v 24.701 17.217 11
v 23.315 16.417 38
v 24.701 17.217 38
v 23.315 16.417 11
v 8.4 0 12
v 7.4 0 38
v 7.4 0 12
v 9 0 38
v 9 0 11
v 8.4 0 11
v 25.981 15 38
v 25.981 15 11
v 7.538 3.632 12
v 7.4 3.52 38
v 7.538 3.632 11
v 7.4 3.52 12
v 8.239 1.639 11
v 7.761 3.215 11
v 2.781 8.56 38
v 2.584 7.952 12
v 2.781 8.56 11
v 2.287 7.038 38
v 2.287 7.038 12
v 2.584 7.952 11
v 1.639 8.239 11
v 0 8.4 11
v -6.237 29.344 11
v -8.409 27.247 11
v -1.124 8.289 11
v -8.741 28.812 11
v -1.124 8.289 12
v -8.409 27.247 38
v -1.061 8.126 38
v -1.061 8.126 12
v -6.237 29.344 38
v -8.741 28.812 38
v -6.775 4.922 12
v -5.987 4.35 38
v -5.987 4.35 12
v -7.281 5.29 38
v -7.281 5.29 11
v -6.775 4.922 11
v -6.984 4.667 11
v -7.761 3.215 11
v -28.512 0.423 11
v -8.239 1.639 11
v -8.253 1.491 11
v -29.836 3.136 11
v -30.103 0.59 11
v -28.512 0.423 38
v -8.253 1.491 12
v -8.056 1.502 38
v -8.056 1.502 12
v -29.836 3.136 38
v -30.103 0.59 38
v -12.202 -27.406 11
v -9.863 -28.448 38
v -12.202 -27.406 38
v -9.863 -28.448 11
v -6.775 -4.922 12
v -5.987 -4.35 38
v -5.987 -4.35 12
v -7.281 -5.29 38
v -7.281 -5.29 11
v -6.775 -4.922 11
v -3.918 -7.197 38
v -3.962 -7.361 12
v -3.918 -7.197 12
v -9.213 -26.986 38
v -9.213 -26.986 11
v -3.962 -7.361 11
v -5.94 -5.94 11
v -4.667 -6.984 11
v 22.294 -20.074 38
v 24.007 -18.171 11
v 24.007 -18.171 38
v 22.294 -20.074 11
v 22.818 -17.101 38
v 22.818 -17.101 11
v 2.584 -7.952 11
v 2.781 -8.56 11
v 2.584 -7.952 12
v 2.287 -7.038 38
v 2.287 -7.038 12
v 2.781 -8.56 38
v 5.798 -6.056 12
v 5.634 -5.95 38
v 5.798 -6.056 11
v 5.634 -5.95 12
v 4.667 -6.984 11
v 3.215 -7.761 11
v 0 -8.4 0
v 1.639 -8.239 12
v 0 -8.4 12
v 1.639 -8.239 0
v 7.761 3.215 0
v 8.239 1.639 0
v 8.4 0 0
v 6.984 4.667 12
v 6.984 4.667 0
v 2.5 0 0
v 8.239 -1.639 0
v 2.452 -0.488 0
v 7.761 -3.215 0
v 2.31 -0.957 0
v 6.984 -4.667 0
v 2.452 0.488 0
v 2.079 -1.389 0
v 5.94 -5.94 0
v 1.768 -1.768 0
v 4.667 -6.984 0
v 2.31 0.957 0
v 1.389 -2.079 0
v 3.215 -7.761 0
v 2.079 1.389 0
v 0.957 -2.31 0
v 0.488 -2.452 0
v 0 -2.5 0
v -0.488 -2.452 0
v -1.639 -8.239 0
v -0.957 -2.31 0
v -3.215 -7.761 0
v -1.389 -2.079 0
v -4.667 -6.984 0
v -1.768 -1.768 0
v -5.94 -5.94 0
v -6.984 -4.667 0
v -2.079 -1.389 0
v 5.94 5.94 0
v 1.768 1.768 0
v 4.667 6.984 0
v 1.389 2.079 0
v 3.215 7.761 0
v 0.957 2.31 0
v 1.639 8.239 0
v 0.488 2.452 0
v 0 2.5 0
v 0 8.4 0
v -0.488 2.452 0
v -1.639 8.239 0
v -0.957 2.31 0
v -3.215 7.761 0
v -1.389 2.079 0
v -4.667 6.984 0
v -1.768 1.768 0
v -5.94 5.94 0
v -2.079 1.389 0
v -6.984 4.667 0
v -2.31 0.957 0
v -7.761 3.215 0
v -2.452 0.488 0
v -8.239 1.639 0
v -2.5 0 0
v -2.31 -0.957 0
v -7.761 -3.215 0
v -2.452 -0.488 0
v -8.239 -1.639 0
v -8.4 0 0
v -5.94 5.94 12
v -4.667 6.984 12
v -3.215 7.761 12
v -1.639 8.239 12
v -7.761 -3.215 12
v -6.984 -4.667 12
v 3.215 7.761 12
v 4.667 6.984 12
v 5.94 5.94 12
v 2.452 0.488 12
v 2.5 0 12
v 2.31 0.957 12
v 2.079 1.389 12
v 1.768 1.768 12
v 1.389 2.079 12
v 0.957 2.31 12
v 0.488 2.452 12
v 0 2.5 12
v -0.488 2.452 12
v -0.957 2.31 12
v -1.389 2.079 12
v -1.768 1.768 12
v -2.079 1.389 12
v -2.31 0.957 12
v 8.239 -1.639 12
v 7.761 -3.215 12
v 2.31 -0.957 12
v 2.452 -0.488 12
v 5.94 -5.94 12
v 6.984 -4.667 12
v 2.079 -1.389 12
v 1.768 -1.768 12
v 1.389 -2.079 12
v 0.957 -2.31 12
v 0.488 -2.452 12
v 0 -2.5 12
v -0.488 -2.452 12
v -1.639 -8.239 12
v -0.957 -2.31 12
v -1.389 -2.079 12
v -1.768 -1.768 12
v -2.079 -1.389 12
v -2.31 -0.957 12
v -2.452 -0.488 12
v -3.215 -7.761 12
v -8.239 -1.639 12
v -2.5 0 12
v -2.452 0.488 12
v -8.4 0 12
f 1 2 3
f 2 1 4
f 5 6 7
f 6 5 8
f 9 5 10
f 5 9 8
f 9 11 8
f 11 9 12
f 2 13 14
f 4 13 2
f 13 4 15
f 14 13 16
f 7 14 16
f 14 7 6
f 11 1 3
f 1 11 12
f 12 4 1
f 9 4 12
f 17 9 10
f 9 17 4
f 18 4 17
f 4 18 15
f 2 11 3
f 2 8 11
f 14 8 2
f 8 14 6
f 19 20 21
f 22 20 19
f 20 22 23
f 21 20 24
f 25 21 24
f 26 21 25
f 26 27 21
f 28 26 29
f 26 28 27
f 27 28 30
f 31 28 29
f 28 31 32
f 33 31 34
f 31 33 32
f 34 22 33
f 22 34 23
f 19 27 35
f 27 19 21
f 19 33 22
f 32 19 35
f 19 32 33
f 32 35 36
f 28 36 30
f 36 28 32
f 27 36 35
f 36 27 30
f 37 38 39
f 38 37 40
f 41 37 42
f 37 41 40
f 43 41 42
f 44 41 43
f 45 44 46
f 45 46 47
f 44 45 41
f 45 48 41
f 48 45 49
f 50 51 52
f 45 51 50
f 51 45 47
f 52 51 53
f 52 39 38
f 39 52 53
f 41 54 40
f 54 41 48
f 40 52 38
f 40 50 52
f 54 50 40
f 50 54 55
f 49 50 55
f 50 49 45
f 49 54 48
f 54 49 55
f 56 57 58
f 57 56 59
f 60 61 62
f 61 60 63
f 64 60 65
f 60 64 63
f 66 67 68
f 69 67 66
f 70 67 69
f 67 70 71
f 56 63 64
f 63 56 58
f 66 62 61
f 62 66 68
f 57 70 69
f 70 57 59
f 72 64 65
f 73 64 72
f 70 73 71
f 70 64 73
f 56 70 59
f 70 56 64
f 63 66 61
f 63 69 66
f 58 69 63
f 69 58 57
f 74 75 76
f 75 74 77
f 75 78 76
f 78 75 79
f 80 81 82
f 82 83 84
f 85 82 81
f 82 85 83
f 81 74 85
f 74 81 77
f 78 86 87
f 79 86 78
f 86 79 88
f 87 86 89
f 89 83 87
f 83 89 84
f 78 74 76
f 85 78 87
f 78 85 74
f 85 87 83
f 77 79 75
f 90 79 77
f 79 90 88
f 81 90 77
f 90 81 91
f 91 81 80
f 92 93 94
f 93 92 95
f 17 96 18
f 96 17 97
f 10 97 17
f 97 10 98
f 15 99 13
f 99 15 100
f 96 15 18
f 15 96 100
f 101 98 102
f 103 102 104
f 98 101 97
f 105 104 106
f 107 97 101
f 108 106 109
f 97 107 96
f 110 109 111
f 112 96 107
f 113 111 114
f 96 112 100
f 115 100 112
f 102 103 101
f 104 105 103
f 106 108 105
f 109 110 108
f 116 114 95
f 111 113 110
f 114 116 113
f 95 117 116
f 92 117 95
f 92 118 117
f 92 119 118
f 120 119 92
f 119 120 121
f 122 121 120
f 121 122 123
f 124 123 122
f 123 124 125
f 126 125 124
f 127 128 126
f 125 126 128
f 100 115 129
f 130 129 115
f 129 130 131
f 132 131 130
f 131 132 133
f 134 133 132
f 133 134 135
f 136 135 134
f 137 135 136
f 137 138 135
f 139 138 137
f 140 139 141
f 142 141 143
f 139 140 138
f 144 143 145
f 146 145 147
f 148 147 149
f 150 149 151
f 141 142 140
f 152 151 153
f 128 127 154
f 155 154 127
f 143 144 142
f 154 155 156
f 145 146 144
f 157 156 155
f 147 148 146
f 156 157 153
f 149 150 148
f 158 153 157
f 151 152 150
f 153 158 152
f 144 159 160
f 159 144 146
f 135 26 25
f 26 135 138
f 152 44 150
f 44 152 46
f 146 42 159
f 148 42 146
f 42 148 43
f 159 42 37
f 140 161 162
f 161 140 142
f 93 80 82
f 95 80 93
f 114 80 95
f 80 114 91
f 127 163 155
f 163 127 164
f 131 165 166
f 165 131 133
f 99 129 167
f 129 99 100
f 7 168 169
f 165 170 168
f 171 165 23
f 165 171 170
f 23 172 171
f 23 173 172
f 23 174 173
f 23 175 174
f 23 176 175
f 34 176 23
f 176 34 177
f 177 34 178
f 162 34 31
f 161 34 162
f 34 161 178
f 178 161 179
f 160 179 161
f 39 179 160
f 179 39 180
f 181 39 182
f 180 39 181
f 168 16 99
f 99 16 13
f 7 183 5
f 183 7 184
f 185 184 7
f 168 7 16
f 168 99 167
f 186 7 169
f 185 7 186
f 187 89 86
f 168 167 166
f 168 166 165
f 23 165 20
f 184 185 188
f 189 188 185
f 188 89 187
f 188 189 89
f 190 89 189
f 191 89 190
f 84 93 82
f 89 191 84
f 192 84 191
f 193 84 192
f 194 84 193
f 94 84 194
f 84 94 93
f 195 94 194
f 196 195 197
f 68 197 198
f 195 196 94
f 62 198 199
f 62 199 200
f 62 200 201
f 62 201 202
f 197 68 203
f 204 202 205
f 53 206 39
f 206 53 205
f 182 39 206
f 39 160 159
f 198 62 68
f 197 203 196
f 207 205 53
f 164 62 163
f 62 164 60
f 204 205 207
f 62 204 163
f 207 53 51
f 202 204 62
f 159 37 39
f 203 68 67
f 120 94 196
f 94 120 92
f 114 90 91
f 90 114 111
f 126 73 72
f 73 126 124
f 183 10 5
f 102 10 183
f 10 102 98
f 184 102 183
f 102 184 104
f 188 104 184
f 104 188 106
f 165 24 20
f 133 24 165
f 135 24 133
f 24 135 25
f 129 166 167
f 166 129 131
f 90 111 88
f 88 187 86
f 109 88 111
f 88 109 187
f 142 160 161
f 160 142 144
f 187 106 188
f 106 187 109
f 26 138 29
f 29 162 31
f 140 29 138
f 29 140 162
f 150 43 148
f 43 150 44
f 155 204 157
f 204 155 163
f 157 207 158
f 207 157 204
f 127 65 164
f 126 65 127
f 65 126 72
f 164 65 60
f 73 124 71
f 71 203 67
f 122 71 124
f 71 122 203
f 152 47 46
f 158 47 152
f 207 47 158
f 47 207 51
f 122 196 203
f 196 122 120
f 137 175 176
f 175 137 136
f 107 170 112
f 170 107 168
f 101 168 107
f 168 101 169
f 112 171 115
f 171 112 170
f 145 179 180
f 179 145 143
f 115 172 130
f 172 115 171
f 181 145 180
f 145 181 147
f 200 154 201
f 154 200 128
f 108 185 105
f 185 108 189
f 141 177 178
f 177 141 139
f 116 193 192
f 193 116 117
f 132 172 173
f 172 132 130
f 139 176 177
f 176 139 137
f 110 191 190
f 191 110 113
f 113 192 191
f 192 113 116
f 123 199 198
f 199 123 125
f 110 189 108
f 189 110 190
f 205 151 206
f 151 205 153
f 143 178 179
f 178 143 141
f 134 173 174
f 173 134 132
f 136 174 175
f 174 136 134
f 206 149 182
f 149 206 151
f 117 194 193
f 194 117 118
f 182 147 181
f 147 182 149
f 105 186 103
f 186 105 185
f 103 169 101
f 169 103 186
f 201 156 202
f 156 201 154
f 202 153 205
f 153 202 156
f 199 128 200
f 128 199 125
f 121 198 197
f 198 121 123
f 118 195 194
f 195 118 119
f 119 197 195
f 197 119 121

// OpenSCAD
$fn = 32;

// ----------------------------------------------------------------------
// Impeller: 60 mm, 5 blades, 38 mm tall
// ----------------------------------------------------------------------

// --- parameters (mm) ---
center_d = 16.8;          // hub diameter
center_h = 12;            // hub height
wheel_d = 60;             // outer diameter over the blades
blade_count = 5;          // number of blades
blade_t = 1.6;            // blade thickness
blade_h = 26;             // blade height
blade_in_r = 7.4;         // blade root radius
blade_out_r = 28.4;       // blade tip radius
sweep = 30;               // blade sweep, degrees
bore_d = 5;               // shaft bore

module hub() {
  cylinder(h = center_h, d = center_d);
}

module blade() {
  /* blade swept between two boxes: hull of the root and the tip section */
  hull() {
    translate([blade_in_r, 0, center_h - 1])
      cube([blade_t, blade_t * 2.2, blade_h + 1], center = false);
    rotate([0, 0, sweep])
      translate([blade_out_r, 0, center_h - 1])
        cube([blade_t, blade_t * 1.6, blade_h + 1], center = false);
  }
}

module blades() {
  for (i = [0 : blade_count - 1])
    rotate([0, 0, i * 360 / blade_count]) blade();
}

difference() {
  union() {
    hub();
    blades();
  }
  translate([0, 0, -1]) cylinder(h = center_h + blade_h + 0 + 3, d = bore_d);
}
